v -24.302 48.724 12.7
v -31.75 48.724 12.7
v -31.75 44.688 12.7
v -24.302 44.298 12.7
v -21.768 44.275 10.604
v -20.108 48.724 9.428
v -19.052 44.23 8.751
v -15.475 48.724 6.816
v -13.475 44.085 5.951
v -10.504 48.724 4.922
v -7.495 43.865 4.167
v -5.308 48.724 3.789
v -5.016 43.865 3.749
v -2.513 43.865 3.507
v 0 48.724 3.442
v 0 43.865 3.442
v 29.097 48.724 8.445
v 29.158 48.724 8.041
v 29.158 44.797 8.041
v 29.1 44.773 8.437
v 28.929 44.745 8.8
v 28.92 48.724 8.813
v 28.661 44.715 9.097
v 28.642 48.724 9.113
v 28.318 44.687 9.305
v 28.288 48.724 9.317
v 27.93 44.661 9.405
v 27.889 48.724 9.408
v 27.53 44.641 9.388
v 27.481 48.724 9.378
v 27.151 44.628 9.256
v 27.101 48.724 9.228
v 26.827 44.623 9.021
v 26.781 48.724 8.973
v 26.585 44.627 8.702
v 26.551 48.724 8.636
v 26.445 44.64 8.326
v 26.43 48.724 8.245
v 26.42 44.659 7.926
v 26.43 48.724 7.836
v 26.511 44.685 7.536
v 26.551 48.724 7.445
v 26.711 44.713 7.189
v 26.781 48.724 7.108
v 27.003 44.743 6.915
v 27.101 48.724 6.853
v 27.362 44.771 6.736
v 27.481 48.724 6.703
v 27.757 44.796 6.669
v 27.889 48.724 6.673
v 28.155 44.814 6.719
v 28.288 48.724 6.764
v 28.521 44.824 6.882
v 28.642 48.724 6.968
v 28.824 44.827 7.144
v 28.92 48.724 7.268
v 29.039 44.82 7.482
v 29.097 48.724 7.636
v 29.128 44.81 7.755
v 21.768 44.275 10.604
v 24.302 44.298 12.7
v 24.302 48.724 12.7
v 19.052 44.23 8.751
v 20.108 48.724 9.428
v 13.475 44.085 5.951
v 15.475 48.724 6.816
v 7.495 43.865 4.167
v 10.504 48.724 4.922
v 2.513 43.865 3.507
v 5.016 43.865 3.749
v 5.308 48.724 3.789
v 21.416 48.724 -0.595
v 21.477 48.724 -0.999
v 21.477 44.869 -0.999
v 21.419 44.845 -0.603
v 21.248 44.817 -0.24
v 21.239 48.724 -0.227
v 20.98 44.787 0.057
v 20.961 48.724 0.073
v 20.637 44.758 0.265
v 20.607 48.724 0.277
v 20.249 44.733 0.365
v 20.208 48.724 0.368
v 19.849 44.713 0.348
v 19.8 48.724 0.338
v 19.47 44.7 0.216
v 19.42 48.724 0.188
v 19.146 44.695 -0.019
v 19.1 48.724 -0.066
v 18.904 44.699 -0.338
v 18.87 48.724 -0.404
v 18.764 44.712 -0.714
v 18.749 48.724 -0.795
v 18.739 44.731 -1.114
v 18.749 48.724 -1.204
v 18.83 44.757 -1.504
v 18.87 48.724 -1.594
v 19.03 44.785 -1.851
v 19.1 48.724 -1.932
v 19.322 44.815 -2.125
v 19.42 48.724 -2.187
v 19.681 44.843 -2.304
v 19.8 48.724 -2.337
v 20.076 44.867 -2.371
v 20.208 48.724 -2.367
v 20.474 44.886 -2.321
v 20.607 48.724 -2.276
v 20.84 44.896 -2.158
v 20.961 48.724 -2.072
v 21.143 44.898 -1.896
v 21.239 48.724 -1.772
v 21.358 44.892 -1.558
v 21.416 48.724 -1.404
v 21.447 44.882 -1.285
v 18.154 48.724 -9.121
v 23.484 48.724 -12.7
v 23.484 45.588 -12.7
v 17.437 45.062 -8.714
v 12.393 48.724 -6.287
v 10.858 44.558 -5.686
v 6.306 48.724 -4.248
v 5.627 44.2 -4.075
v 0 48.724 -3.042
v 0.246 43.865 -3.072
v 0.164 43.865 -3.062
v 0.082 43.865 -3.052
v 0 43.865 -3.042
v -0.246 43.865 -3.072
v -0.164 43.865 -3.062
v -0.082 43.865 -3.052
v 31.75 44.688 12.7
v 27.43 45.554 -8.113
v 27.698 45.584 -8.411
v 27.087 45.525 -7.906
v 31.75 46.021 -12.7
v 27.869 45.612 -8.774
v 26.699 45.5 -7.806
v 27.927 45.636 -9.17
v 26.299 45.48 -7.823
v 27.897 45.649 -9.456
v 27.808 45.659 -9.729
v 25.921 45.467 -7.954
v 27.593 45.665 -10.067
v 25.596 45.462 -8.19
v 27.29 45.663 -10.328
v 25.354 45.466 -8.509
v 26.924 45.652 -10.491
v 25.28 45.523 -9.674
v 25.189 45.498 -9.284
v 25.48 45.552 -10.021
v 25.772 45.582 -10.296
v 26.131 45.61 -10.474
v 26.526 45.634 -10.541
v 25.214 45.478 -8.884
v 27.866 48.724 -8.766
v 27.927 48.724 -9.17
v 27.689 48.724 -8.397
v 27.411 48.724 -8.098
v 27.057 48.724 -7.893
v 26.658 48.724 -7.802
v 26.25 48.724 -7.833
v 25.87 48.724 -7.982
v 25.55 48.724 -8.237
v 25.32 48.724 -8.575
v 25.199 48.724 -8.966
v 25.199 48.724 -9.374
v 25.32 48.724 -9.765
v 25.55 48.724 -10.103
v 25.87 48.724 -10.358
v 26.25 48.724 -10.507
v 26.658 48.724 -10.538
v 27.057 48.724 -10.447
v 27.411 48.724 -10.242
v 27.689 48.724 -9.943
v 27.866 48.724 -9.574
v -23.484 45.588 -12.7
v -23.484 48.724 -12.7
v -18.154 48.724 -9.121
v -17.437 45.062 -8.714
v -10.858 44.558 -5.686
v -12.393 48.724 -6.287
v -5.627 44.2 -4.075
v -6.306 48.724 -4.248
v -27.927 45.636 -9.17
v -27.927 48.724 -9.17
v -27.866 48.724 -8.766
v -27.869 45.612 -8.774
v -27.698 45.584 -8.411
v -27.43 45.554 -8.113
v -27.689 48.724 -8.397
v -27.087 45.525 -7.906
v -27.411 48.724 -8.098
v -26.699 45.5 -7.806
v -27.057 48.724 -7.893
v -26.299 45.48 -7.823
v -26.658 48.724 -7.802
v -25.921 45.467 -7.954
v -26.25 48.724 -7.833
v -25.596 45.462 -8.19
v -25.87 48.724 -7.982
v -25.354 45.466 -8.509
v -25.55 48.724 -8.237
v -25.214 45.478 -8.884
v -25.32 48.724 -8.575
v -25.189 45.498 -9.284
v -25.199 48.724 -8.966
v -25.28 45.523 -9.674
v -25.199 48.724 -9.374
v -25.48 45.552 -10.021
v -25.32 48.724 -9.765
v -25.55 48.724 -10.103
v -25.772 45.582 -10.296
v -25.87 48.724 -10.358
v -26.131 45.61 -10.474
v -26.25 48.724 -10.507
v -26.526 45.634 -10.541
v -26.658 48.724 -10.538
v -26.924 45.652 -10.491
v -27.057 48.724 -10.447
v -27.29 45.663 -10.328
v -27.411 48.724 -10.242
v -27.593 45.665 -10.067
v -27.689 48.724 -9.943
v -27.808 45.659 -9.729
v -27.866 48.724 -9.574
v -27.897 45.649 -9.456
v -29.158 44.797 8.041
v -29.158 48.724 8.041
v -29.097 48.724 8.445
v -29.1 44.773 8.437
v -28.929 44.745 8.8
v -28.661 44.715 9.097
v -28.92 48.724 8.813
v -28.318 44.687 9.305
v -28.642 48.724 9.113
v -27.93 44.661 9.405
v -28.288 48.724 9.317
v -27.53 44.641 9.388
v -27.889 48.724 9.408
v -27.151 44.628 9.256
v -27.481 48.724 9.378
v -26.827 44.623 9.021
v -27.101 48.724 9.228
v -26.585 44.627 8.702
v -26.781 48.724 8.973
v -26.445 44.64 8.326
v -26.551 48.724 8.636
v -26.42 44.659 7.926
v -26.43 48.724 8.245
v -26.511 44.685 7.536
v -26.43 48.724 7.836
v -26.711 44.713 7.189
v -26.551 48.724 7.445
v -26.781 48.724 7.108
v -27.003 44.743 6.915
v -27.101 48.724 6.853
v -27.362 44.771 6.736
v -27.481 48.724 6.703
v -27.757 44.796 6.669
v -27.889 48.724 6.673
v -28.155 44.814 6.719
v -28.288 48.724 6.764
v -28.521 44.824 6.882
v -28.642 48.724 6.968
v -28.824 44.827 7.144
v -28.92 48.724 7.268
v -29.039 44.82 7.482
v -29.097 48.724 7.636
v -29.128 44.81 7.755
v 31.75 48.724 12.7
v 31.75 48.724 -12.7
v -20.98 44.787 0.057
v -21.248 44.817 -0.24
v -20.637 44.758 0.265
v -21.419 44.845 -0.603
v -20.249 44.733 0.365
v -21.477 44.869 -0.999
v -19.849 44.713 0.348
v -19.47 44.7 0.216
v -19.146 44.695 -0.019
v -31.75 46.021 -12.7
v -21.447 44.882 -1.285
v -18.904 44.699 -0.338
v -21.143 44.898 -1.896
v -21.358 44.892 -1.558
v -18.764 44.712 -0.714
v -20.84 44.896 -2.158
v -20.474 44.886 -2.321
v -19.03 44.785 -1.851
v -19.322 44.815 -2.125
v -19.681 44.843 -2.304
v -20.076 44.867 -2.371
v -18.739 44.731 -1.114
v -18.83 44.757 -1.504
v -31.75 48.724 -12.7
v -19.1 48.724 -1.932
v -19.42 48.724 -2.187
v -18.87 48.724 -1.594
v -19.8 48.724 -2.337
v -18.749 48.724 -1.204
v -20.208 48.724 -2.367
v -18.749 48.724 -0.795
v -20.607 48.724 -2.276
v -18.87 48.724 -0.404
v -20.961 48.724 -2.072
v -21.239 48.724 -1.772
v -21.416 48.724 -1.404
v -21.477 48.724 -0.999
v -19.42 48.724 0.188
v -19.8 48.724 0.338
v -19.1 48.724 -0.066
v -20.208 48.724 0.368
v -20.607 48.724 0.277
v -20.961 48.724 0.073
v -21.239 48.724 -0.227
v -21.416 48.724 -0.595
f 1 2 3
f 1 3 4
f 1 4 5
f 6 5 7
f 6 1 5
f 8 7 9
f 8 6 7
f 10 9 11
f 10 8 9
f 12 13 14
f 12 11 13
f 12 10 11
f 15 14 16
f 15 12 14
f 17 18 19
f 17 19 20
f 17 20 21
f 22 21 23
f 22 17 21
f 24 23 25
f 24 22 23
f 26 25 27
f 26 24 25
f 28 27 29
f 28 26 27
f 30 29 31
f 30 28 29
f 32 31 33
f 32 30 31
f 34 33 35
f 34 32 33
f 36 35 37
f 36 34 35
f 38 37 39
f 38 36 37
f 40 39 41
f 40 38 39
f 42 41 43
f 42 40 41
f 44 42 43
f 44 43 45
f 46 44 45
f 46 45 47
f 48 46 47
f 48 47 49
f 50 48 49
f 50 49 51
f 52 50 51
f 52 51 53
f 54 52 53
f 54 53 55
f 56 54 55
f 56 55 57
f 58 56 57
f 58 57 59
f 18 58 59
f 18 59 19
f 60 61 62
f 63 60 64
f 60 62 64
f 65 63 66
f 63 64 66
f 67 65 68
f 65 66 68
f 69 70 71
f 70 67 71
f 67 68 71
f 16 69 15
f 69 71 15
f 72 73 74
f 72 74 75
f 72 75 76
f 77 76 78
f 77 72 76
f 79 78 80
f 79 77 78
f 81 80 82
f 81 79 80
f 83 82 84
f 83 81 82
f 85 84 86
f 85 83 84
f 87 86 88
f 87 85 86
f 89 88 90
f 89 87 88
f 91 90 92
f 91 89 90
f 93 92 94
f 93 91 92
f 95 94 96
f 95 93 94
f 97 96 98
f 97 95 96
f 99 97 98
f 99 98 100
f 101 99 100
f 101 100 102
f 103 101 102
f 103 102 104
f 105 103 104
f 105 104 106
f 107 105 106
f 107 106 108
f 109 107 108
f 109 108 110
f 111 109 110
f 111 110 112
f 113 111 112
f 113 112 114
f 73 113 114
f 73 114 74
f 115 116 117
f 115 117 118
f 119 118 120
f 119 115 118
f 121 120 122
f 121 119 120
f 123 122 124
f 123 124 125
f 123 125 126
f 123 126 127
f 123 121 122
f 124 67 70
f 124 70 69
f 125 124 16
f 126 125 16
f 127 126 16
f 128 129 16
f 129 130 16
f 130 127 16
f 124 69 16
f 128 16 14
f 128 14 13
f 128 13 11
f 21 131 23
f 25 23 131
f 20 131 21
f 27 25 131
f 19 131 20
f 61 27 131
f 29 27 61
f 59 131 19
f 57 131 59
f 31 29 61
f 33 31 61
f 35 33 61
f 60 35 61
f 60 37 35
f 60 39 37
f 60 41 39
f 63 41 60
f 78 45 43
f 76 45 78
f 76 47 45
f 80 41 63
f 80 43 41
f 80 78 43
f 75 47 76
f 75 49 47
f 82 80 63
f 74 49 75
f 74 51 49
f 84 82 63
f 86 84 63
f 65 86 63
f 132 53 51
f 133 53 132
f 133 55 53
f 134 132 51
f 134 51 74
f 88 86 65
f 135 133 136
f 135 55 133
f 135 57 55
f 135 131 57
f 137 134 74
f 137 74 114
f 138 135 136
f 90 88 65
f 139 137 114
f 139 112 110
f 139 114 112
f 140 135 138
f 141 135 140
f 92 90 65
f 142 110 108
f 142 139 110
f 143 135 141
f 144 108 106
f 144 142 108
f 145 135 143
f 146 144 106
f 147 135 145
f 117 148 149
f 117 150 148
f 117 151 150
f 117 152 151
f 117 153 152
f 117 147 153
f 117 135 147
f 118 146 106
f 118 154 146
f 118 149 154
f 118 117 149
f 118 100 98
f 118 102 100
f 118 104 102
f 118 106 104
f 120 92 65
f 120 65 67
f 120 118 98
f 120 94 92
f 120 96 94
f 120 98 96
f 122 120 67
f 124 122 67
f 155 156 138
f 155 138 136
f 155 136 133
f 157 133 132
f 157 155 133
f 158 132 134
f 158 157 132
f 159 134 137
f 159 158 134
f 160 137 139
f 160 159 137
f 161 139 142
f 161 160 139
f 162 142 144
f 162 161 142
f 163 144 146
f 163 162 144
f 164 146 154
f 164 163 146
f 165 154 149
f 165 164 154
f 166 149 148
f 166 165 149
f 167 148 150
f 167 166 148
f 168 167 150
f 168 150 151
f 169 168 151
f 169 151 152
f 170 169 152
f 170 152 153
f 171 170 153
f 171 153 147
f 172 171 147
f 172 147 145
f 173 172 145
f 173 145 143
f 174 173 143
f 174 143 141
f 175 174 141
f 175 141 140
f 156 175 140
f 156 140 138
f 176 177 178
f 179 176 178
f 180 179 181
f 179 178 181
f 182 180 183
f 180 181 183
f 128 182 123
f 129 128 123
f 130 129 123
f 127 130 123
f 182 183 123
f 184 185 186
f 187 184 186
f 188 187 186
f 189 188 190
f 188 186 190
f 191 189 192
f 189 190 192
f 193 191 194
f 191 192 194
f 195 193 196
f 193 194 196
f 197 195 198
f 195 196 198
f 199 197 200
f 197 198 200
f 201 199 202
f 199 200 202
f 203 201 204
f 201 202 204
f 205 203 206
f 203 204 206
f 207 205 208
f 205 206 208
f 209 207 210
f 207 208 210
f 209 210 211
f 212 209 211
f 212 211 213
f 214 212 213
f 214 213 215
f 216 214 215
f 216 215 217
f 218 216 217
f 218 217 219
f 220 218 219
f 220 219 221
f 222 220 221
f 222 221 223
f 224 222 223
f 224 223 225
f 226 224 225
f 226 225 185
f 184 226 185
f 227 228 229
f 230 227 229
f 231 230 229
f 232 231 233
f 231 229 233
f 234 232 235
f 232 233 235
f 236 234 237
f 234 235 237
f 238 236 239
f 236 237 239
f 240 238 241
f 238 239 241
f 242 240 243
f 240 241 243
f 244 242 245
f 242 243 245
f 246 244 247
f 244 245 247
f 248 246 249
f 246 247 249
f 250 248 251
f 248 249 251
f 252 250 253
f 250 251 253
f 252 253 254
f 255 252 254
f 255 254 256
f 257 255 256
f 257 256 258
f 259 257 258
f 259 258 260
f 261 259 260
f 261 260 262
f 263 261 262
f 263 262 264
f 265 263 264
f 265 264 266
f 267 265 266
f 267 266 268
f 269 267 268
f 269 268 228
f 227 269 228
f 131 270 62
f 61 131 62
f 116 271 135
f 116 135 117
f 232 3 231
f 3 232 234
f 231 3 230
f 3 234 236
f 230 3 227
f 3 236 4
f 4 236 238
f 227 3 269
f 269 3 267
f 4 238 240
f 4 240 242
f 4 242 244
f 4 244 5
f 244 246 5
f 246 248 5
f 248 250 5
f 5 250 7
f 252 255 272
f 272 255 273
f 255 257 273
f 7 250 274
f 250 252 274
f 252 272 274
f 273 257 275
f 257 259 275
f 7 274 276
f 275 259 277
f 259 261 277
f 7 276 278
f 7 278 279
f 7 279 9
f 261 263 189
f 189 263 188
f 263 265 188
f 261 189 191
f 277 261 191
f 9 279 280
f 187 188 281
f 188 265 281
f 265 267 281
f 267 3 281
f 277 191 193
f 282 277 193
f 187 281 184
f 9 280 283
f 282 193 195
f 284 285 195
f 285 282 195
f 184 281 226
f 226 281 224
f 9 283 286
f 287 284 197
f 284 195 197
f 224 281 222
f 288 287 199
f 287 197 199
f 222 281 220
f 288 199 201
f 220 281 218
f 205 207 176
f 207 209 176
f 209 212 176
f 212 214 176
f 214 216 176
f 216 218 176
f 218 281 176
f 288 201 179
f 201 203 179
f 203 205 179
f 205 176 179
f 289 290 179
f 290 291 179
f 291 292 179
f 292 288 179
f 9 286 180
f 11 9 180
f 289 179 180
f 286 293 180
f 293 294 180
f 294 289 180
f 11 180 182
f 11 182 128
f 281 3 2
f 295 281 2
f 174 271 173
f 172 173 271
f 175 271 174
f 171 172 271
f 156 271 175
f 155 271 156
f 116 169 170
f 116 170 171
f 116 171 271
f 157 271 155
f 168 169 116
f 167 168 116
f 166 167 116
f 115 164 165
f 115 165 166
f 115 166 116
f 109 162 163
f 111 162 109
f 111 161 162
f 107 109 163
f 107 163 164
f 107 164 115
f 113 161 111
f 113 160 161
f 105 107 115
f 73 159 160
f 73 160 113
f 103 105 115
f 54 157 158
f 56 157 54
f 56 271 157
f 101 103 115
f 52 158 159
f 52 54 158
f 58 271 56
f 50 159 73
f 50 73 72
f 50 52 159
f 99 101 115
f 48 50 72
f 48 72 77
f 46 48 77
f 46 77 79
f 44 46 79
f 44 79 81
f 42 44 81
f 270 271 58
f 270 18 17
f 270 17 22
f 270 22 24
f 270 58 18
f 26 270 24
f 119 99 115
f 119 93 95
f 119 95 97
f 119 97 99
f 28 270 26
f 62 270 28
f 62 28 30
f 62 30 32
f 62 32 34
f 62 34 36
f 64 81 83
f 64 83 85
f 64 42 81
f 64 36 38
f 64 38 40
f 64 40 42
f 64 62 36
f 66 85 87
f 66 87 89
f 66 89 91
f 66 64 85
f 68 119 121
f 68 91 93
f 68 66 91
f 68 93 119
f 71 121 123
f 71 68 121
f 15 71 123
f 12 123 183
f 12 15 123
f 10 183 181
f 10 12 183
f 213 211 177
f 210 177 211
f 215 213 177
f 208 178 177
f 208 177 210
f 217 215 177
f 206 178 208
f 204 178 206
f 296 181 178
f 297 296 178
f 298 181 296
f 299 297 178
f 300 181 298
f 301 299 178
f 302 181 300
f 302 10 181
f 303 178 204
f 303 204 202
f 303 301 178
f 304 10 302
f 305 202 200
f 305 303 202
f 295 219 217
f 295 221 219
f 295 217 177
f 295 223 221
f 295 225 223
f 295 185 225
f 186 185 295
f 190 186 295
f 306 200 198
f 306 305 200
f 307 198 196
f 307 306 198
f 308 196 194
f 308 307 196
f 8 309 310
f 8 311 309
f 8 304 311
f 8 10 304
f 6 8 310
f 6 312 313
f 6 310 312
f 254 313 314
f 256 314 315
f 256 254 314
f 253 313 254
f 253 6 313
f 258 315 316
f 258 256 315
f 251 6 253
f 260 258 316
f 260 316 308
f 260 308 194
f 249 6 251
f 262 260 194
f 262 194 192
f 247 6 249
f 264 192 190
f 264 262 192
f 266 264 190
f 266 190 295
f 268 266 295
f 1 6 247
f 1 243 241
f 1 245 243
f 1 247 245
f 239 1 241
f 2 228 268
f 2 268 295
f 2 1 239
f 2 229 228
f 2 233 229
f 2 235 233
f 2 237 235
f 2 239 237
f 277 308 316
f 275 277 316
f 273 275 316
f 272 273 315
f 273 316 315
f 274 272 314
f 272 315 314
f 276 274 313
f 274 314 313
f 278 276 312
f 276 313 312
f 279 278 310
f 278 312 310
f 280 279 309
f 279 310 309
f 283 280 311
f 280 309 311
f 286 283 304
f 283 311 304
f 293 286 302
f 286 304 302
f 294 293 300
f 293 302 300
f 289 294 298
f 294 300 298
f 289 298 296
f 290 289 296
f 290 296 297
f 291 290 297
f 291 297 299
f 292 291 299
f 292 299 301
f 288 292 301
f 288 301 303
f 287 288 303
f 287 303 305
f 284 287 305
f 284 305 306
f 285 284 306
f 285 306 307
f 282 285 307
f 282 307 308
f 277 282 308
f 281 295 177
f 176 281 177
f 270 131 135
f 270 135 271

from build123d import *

# Parameters (mm, degrees)
SKETCH1_W                = 31.75
SKETCH1_H                = 4.859095613
BOSS_EXTRUDE1_DEPTH      = 12.7
BOSS_EXTRUDE1_DEPTH_BACK = 12.7
SKETCH3_R                = 1.3716
CUT_EXTRUDE1_DEPTH       = 10.16


with BuildPart() as part:
    # Sketch1 → Boss-Extrude1 (new, two sides)
    with BuildSketch(Plane.XY) as boss_extrude1_sk:
        with Locations((-15.875, 46.294481234)):
            Rectangle(SKETCH1_W, SKETCH1_H)
    extrude(amount=BOSS_EXTRUDE1_DEPTH)
    extrude(boss_extrude1_sk.sketch, amount=-BOSS_EXTRUDE1_DEPTH_BACK)

    # Sketch3 → Cut-Extrude1 (cut)
    with BuildSketch(Plane(origin=(0, 48.72402904, 0), x_dir=(1, 0, 0), z_dir=(0, 1, 0))):
        with Locations(Location((-20.105647723, 0.999384842, 0), (0, 0, 180))):
            Circle(SKETCH3_R)
        with Locations(Location((-26.555704526, 9.169971692, 0), (0, 0, 180))):
            Circle(SKETCH3_R)
        with Locations(Location((-27.786476371, -8.040568412, 0), (0, 0, 180))):
            Circle(SKETCH3_R)
        with BuildLine():
            Line((0, 3.041554035), (0, 12.7))
            Line((0, 12.7), (-23.483825151, 12.7))
            ThreePointArc((-23.483825151, 12.7), (-12.393492486, 6.286506758), (0, 3.041554035))
        make_face()
        with BuildLine():
            Line((0, -3.441610433), (0, -12.7))
            Line((0, -12.7), (-24.301693504, -12.7))
            ThreePointArc((-24.301693504, -12.7), (-13.024999481, -5.776303398), (0, -3.441610433))
        make_face()
    extrude(amount=-CUT_EXTRUDE1_DEPTH, mode=Mode.SUBTRACT)

    # SurfaceCut1
    split(bisect_by=Plane(origin=(2.277212667, 43.451806158, 2.28033779), x_dir=(0.9986332910992534, -0.052192408999060975, -0.0027390420129575405), z_dir=(0.05226423163382398, 0.9972609476841369, 0.0523359562429442)), keep=Keep.TOP)

    # Mirror1: part across plane


with BuildPart() as part_1:
    add(part.part)
    add(part.part.mirror(Plane(origin=(0, 48.72402904, -12.7), x_dir=(0, 0, 1), z_dir=(-1, 0, 0))))


solid = part_1.part
